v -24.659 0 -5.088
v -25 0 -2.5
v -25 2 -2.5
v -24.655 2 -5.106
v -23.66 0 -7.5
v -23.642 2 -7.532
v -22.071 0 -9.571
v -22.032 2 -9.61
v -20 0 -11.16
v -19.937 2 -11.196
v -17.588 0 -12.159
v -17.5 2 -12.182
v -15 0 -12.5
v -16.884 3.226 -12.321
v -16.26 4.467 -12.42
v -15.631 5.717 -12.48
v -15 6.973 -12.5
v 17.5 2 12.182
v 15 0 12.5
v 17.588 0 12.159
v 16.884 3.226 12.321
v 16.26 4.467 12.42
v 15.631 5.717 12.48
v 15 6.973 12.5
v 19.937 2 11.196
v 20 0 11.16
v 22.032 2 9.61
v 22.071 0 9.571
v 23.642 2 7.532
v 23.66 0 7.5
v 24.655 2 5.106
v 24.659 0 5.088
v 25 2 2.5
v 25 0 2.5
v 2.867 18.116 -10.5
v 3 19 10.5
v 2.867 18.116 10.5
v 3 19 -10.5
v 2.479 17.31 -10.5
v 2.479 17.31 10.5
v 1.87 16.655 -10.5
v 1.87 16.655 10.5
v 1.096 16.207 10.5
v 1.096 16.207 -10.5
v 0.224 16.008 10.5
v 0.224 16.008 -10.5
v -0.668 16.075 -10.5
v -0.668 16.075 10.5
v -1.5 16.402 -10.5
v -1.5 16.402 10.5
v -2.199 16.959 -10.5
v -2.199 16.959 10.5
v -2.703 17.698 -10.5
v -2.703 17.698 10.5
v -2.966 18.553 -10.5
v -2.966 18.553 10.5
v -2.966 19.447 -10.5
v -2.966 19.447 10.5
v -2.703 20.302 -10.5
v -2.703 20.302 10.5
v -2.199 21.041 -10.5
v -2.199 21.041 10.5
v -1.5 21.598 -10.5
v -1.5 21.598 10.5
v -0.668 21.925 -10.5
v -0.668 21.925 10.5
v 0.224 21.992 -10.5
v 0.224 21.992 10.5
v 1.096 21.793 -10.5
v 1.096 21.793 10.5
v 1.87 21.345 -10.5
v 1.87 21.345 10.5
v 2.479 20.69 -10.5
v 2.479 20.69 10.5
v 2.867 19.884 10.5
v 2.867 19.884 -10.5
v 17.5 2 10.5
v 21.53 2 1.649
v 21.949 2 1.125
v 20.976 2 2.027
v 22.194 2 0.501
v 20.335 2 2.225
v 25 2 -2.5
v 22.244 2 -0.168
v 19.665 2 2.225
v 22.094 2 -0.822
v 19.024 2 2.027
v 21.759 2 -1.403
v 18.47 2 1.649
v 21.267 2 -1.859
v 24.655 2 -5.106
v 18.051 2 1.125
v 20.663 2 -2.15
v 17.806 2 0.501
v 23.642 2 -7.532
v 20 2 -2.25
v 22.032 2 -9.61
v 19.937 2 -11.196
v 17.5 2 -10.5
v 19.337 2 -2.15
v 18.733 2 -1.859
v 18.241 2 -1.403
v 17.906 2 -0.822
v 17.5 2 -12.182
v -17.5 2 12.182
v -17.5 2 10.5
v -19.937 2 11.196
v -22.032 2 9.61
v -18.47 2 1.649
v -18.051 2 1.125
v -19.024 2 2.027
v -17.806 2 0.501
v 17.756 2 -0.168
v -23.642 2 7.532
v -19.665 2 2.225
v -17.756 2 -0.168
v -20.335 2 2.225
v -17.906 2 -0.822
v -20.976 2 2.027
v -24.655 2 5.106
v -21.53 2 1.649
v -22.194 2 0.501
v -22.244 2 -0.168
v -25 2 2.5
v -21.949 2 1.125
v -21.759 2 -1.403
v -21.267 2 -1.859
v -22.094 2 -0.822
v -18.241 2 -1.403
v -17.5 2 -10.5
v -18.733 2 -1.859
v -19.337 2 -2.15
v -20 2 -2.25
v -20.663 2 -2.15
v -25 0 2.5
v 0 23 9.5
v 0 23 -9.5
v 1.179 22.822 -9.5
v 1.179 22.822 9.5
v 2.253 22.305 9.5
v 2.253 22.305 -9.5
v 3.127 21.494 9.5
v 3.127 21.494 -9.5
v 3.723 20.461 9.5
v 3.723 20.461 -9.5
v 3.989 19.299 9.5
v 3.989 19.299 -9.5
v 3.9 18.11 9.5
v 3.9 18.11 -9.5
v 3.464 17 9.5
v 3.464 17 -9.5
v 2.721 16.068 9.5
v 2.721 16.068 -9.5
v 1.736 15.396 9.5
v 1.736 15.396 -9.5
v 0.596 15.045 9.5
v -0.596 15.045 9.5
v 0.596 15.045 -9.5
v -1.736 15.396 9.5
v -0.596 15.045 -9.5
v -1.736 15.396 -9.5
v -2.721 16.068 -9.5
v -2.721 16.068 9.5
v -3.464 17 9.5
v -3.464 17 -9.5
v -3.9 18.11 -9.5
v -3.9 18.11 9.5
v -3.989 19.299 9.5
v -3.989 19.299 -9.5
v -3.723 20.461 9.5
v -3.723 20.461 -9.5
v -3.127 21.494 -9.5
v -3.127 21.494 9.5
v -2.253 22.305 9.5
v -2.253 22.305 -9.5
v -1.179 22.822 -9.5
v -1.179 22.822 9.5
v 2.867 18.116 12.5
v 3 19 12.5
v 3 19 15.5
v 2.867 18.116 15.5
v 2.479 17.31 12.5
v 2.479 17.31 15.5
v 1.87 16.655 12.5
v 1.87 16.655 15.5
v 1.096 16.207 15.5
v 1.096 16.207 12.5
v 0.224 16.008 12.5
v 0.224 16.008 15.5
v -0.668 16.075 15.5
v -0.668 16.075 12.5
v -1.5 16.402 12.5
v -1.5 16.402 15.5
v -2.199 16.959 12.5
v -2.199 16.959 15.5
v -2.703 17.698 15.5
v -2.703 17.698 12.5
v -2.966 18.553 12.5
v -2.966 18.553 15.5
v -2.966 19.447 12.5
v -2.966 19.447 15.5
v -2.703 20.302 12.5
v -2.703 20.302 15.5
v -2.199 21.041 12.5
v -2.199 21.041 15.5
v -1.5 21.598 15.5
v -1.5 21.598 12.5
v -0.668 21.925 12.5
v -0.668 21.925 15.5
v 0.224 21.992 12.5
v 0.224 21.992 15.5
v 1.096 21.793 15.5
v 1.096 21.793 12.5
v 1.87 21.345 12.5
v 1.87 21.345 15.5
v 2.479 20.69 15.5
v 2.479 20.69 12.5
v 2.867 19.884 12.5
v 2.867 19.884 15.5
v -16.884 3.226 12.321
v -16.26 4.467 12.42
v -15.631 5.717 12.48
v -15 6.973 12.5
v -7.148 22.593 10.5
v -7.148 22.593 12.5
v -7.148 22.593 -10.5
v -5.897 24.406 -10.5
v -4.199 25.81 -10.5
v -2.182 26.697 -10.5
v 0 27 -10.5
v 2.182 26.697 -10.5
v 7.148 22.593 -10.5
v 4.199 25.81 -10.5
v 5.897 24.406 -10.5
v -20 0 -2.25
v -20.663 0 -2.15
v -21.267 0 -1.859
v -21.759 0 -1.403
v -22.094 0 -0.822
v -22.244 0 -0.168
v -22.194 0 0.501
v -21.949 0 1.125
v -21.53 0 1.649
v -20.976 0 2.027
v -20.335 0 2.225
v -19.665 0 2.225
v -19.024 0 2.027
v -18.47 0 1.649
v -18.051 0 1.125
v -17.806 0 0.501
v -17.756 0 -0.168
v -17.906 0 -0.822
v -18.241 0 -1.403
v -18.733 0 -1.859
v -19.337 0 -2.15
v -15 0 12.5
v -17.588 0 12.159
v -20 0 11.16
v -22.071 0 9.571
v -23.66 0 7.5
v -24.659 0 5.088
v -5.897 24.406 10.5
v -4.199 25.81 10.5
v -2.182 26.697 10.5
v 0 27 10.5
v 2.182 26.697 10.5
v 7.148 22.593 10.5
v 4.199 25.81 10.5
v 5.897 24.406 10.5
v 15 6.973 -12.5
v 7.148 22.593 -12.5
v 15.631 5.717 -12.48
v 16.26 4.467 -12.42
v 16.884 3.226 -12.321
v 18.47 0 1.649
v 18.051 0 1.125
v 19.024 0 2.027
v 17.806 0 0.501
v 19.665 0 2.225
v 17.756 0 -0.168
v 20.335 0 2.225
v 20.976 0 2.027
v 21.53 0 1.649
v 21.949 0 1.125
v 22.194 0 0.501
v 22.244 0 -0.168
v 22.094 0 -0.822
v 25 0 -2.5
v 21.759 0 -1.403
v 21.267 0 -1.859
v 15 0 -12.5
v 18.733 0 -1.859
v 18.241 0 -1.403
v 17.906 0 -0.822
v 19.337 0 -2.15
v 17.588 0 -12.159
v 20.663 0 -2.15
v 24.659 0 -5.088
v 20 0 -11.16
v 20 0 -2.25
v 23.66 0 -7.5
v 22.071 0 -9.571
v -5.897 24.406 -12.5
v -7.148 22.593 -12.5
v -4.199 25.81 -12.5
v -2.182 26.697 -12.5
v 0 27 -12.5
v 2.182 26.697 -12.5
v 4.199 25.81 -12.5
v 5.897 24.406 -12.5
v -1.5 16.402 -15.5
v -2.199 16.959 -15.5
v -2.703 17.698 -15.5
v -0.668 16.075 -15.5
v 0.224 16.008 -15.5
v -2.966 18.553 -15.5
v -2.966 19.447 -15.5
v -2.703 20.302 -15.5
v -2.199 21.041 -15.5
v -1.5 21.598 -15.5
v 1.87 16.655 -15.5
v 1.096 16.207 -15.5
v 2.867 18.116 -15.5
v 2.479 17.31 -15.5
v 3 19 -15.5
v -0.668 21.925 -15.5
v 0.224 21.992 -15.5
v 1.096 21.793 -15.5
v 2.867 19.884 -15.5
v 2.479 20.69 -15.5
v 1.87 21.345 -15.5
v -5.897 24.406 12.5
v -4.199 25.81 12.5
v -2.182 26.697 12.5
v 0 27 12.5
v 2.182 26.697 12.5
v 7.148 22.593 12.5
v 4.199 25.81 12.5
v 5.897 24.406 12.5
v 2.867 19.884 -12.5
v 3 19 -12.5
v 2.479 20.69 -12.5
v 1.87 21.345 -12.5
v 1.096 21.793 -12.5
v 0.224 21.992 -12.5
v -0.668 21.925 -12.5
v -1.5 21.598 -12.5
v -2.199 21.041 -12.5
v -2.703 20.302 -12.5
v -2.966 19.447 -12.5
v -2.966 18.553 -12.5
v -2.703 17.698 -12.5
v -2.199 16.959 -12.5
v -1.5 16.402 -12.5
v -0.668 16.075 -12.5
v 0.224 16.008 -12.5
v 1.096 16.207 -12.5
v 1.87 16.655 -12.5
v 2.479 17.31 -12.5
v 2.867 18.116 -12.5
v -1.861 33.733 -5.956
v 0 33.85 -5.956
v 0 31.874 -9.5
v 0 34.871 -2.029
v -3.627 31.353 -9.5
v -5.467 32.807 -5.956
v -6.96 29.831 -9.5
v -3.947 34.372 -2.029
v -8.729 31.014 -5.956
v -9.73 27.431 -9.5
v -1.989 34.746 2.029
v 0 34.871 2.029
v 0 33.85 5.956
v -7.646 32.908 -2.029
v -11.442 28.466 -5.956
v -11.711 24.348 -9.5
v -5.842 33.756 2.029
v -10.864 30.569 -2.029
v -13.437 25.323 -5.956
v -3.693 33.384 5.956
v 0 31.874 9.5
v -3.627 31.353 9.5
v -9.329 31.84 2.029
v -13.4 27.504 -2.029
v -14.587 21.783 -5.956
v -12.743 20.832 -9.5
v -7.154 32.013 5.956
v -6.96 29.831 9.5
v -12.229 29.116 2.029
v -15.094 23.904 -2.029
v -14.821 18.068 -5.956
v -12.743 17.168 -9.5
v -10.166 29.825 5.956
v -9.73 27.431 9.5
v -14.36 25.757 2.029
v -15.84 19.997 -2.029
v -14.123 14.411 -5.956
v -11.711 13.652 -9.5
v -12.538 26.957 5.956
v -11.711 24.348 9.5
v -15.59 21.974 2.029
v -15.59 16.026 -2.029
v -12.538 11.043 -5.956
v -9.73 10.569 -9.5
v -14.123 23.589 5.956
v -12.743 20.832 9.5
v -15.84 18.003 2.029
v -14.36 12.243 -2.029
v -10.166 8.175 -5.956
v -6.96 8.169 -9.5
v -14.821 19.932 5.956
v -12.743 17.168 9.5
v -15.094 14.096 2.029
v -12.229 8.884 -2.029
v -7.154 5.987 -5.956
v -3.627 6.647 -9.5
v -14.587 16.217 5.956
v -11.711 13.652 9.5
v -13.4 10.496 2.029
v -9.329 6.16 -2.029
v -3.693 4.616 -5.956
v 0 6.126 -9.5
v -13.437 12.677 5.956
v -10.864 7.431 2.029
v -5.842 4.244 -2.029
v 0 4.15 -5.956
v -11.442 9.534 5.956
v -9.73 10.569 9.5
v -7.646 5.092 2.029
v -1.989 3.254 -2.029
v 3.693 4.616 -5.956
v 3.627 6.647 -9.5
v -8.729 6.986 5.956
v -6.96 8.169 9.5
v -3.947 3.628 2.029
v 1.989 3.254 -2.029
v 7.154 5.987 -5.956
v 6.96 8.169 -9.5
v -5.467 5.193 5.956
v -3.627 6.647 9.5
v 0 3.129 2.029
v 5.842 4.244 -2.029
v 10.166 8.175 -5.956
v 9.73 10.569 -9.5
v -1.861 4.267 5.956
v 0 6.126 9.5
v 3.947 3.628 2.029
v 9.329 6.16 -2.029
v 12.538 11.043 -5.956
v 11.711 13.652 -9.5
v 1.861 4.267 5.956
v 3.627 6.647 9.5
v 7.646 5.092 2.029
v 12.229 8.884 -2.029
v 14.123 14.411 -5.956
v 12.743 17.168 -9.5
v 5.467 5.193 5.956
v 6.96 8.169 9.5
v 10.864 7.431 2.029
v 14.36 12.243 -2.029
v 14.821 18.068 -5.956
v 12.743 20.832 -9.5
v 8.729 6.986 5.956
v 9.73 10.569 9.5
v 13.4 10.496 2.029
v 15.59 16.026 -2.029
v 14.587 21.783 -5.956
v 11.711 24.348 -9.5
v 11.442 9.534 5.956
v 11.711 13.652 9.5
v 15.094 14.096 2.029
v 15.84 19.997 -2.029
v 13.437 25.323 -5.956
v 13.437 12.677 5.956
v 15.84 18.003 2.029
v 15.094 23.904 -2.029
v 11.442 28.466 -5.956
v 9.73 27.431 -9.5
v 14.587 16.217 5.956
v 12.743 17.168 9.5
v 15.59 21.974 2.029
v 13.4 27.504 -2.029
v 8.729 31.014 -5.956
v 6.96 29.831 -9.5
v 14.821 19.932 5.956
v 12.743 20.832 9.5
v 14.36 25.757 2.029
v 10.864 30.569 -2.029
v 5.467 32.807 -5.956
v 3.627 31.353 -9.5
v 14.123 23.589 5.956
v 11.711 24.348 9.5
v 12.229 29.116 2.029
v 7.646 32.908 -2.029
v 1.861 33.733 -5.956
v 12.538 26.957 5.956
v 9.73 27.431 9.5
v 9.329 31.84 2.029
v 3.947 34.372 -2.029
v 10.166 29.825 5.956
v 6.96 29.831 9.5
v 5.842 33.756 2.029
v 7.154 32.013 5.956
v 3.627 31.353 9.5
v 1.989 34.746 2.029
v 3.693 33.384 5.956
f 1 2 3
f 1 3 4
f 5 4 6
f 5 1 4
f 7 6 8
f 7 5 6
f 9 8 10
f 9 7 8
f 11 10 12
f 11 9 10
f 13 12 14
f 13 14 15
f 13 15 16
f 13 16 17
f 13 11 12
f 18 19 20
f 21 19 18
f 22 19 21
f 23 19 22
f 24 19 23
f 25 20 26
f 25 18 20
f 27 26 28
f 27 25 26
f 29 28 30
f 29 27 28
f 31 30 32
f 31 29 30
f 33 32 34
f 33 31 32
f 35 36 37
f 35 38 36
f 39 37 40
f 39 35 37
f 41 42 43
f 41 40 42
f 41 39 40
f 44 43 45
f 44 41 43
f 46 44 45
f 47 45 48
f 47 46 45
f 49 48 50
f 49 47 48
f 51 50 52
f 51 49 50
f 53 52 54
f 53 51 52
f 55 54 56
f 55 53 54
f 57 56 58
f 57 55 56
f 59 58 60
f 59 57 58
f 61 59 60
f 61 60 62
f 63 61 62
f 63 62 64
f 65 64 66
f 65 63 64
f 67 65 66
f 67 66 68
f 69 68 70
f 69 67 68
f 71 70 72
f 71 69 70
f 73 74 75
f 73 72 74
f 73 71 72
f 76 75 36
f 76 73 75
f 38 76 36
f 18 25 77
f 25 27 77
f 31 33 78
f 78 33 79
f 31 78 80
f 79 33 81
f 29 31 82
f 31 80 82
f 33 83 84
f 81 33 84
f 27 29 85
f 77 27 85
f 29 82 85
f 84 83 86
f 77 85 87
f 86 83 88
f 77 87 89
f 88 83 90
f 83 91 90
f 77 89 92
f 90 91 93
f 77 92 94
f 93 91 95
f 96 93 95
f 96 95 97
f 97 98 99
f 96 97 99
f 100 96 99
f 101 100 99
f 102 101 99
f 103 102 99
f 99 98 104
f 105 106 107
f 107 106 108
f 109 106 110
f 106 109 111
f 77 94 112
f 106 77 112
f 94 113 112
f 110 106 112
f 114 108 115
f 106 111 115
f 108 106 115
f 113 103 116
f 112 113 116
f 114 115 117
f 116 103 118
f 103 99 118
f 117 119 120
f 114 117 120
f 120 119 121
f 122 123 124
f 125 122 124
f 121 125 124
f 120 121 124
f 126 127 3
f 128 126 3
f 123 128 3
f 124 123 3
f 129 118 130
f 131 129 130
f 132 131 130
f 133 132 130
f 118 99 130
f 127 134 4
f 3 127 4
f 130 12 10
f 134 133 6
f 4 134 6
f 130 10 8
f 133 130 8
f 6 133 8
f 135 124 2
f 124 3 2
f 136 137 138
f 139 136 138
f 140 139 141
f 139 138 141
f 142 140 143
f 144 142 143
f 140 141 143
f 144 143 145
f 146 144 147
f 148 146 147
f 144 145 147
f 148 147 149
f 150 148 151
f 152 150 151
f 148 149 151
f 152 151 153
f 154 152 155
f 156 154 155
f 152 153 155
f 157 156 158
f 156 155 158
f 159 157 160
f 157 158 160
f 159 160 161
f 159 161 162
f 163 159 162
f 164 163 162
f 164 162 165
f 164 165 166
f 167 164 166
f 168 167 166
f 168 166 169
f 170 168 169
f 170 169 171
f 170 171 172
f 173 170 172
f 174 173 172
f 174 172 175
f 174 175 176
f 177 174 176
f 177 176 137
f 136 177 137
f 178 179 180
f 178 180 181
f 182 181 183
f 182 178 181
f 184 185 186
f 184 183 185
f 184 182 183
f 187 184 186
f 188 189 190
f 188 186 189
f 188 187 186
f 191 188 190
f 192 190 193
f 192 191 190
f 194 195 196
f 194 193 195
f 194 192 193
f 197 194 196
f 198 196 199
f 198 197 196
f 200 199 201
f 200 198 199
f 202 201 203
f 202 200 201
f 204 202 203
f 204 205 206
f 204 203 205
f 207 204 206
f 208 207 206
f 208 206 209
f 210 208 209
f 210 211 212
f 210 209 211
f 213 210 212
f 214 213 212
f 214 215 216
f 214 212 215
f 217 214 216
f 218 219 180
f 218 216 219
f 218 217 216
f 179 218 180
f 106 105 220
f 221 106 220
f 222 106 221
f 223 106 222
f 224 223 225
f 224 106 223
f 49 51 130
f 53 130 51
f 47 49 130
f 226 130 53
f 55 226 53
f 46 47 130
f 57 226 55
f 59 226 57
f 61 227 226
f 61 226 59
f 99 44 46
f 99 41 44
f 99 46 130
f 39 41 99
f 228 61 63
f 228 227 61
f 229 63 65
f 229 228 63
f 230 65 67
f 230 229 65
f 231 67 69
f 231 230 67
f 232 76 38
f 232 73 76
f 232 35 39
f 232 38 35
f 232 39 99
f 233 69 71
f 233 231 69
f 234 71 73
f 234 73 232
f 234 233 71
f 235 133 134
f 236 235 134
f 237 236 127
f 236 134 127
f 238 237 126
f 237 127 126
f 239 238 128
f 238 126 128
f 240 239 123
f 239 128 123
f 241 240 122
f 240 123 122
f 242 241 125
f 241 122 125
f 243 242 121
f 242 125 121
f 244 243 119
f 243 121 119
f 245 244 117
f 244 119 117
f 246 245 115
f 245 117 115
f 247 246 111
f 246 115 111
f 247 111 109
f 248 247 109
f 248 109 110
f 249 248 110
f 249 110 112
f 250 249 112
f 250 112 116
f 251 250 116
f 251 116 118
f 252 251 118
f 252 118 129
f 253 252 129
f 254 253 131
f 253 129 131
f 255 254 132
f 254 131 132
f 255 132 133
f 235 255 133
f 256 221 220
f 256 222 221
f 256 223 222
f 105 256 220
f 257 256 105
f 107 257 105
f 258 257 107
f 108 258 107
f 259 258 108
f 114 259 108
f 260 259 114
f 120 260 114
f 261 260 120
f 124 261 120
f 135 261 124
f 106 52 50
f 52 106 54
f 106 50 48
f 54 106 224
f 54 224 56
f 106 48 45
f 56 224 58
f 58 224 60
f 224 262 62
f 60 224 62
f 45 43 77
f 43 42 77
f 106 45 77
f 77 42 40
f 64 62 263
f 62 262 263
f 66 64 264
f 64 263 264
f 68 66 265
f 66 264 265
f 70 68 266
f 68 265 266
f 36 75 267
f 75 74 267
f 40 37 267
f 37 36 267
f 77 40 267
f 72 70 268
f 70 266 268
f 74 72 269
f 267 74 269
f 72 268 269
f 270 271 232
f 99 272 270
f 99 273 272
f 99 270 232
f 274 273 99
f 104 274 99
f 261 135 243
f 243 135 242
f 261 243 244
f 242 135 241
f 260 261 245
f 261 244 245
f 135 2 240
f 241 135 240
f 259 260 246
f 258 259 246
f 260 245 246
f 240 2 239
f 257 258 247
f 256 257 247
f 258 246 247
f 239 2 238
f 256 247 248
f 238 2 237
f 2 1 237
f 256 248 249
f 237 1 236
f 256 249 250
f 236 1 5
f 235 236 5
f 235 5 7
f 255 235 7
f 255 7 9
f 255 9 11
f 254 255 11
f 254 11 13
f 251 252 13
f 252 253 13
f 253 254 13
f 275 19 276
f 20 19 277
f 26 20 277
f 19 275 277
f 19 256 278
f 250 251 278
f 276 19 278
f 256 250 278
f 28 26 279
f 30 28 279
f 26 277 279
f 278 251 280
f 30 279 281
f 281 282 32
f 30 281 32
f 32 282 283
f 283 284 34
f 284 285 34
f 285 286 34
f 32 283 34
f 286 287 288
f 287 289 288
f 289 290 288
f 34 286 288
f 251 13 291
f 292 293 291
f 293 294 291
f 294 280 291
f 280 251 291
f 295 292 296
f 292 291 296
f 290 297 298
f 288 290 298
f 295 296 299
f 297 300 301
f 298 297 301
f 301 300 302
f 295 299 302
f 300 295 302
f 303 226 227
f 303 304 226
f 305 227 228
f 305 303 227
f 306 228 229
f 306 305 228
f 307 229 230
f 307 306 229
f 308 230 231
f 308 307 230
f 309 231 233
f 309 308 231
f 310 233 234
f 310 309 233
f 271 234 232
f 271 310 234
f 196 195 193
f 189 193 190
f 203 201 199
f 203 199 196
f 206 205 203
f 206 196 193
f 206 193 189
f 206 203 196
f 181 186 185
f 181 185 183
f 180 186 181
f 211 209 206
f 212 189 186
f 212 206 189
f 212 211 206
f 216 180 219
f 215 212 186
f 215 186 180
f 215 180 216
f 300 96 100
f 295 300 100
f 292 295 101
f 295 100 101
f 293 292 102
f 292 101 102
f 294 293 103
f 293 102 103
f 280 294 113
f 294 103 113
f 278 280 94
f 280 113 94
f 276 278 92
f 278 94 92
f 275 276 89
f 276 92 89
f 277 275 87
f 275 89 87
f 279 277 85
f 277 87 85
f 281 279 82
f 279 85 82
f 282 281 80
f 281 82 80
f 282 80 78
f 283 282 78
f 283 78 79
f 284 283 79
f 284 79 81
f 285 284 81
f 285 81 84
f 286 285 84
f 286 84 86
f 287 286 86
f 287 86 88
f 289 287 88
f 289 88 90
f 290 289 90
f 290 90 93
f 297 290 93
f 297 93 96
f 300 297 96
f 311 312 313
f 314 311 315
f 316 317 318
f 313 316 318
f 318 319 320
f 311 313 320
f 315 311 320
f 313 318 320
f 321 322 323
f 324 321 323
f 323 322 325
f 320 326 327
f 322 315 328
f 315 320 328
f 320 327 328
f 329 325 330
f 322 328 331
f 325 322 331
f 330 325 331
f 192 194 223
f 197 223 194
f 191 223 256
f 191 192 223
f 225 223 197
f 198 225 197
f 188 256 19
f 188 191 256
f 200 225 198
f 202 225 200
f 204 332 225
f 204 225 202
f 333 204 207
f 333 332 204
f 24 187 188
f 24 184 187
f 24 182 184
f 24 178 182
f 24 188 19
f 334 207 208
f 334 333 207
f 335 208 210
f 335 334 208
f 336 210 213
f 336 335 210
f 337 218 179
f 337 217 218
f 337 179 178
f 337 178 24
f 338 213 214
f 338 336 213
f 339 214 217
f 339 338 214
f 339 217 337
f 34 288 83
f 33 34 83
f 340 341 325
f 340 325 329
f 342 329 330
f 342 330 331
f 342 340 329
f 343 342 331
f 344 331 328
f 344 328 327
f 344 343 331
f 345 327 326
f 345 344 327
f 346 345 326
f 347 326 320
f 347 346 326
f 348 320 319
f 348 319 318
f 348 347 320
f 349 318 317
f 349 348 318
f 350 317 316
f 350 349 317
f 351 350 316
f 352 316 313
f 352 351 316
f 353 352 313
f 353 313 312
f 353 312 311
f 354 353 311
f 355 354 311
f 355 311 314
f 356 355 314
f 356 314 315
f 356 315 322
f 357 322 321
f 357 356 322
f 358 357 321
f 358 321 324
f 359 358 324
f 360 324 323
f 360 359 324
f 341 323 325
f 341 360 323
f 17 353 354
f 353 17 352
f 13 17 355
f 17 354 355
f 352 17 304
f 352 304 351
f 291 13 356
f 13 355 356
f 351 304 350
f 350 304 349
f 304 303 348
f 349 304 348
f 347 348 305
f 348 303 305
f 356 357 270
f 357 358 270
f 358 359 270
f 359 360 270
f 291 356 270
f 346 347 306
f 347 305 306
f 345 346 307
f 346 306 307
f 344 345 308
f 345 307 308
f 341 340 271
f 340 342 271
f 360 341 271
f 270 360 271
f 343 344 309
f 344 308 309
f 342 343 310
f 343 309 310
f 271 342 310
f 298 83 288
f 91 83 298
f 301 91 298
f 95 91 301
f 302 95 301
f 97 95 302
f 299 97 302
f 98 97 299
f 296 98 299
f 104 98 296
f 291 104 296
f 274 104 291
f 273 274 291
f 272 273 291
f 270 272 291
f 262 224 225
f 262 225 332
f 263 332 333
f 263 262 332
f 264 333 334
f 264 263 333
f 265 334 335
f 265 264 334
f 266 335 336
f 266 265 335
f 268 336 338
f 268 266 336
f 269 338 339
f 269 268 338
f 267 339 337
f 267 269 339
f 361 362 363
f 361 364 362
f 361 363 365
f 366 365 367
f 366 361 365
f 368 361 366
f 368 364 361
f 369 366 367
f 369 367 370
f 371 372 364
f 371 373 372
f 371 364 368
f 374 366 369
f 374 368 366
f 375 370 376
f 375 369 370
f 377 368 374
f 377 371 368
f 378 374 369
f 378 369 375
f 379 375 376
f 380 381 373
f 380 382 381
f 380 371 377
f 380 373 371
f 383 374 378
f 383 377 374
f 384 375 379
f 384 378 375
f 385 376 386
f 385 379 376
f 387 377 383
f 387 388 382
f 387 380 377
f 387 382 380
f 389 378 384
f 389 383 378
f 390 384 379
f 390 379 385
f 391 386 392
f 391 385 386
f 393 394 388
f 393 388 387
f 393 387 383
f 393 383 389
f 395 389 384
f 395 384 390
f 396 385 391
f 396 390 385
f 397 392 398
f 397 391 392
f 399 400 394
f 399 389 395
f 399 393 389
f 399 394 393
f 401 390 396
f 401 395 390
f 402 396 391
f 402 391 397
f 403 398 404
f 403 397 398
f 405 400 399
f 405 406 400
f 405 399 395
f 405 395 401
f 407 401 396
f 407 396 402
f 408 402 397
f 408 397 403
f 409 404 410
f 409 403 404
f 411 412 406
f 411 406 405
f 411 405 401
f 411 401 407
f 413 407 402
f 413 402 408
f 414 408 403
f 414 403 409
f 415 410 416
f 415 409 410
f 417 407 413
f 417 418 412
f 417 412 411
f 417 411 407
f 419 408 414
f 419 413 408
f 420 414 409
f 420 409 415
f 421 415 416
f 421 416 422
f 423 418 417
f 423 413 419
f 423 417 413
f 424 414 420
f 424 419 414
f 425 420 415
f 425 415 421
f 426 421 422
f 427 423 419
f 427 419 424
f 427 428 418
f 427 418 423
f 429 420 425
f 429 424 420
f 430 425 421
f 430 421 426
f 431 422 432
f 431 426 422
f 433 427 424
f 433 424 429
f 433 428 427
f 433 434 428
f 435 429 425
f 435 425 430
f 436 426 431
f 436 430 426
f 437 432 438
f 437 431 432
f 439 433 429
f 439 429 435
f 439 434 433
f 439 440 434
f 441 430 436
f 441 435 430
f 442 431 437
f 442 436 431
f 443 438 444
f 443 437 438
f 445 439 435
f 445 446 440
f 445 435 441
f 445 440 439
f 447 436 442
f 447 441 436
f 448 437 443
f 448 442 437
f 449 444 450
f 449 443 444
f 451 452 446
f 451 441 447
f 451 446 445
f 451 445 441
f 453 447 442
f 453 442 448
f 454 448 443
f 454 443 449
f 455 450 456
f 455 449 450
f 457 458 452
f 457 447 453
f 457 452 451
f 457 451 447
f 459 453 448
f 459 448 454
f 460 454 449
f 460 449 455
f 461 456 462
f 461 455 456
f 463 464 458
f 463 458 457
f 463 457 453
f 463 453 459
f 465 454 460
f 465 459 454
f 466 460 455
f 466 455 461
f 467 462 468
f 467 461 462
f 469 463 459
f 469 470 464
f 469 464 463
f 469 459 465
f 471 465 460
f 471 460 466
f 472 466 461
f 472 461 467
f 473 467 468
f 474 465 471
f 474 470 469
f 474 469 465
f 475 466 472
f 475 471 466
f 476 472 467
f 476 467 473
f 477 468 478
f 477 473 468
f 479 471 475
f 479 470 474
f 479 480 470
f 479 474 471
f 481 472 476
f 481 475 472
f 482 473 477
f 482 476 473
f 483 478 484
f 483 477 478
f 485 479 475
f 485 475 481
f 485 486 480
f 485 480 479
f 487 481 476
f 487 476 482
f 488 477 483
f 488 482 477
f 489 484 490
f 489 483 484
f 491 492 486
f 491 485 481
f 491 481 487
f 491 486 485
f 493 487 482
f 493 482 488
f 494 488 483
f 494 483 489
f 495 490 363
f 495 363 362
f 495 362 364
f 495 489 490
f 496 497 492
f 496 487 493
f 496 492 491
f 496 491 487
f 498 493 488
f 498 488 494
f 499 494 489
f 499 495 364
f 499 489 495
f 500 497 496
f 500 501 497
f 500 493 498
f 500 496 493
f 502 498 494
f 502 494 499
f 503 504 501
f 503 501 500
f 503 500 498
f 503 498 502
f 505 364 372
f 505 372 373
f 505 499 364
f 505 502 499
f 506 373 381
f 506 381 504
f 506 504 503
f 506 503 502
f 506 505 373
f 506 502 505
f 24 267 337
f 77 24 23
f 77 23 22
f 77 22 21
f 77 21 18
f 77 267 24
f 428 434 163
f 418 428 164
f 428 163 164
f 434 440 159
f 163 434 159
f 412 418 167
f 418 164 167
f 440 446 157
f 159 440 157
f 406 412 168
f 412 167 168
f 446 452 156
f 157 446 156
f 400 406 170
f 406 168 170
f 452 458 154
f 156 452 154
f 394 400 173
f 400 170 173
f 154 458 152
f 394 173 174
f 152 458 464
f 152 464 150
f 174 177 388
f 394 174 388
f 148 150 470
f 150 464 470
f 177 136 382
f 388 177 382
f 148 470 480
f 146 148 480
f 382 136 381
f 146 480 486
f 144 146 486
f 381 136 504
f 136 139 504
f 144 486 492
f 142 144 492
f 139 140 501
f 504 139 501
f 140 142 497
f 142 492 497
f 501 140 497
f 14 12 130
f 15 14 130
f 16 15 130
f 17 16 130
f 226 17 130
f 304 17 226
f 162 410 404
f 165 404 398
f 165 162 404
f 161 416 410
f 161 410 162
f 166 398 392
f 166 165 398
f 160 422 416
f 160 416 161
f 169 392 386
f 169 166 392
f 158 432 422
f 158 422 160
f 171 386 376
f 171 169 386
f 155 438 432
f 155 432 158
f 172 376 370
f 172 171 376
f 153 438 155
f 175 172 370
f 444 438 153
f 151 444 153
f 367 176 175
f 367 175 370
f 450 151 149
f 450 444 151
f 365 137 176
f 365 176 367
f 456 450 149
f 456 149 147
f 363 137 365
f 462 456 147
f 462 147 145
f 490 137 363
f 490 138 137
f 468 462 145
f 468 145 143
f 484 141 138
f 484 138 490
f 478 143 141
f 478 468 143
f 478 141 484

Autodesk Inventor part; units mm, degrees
ref_plane "YZ Plane" through (0, 0, 0) normal (1, 0, 0) x (0, 1, 0)
ref_plane "XZ Plane" through (0, 0, 0) normal (0, 1, 0) x (-1, 0, 0)
ref_plane "XY Plane" through (0, 0, 0) normal (0, 0, 1) x (1, 0, 0)
sketch "Sketch1" plane through (0, 0, 0) normal (0, 0, 1) x (1, 0, 0)
  line L0 (-25, 0) -> (25, 0)
  line L1 (25, 0) -> (25, 2)
  line L2 (25, 2) -> (-25, 2)
  line L3 (-25, 2) -> (-25, 0)
  line L4 (-17.5, 2) -> (-7.1477, 22.5932)
  line L5 (7.1477, 22.5932) -> (17.5, 2)
  line L6 (0, 19) -> (0, 2) construction
  arc A0 (7.1477, 22.5932) -> (-7.1477, 22.5932) centre (0, 19) ccw
  circle A1 centre (0, 19) radius 3
  point P0 (0, 0)
  point P1 (0, 0)
  dimension "d0" = 50
  dimension "d1" = 2
  dimension "d2" = 35
  dimension "d3" = 19
  dimension "d4" = 8
  dimension "d5" = 6
extrude "Extrusion1" add sketch "Sketch1" along normal mid plane 25
extrude "Extrusion3" add sketch "Sketch1" along normal mid plane 31 contours A1
extrude "Extrusion2" cut sketch "Sketch1" along normal mid plane 21 contours L4 A0 L5 L2
sketch "Sketch2" plane through (0, 0, 0) normal (1, 0, 0) x (0, 1, 0)
  line L0 (16, -10.5) -> (16, 10.5) projected
  line L1 (16, 10.5) -> (2, 10.5) projected
  line L2 (2, 10.5) -> (2, -10.5) projected
  line L3 (2, -10.5) -> (16, -10.5) projected
  line L4 (22, -12.5) -> (22, -15.5) projected
  line L5 (22, -15.5) -> (16, -15.5) projected
  line L6 (16, -15.5) -> (16, -12.5) projected
  line L7 (16, -12.5) -> (0, -12.5) projected
  line L8 (0, -12.5) -> (0, 12.5) projected
  line L9 (0, 12.5) -> (16, 12.5) projected
  line L10 (16, 12.5) -> (16, 15.5) projected
  line L11 (16, 15.5) -> (22, 15.5) projected
  line L12 (22, 15.5) -> (22, 12.5) projected
  line L13 (22, 12.5) -> (27, 12.5) projected
  line L14 (27, 12.5) -> (27, 10.5) projected
  line L15 (27, 10.5) -> (22, 10.5) projected
  line L16 (22, 10.5) -> (22, -10.5) projected
  line L17 (22, -10.5) -> (27, -10.5) projected
  line L18 (27, -10.5) -> (27, -12.5) projected
  line L19 (27, -12.5) -> (22, -12.5) projected
  line L20 (19, 15.5) -> (19, -15.5)
  line L21 (23, 9.5) -> (23, -9.5)
  line L22 (23, -9.5) -> (31.8744, -9.5)
  line L23 (23, 9.5) -> (31.8744, 9.5)
  arc A0 (31.8744, -9.5) -> (31.8744, 9.5) centre (19, 0) ccw
  line L24 (19, 0) -> (2, 0) construction
  line L25 (35, 9.5) -> (35, -9.5) construction
  line L26 (31.8744, 9.5) -> (35, 9.5) construction
  line L27 (35, -9.5) -> (31.8744, -9.5) construction
  point P0 (0, 0)
  dimension "d12" = 1
  dimension "d13" = 1
  dimension "d14" = 16
  dimension "d15" = 16
revolve "Revolution1" add sketch "Sketch2" angle 360 about axis through (0, 19, 15.5) along (0, 0, -1) contours L23 A0 L22 L21
fillet "Fillet1" radius 10 4 edges at (-25, 1, -12.5) (-25, 1, 12.5) (25, 1, 12.5) (25, 1, -12.5)
sketch "Sketch3" plane through (-15, 0, 12.5) normal (0, -1, 0) x (1, 0, 0)
  line L0 (40, -15) -> (40, -10) projected
  line L1 (0, 0) -> (30, 0) projected
  line L2 (-10, -10) -> (-10, -15) projected
  line L3 (30, -25) -> (0, -25) projected
  line L4 (-10, -12.5) -> (40, -12.5) construction
  line L5 (15, 0) -> (15, -25) construction
  point P0 (15, -12.5)
  point P1 (-5, -12.5)
  point P2 (35, -12.5)
  dimension "d18" = 40
hole "Hole1" at (-20, 0, 0) at (20, 0, 0) direction (0, 1, 0) diameter 4.5 end through all
properties part number "rolka_meblowa_32mm"
